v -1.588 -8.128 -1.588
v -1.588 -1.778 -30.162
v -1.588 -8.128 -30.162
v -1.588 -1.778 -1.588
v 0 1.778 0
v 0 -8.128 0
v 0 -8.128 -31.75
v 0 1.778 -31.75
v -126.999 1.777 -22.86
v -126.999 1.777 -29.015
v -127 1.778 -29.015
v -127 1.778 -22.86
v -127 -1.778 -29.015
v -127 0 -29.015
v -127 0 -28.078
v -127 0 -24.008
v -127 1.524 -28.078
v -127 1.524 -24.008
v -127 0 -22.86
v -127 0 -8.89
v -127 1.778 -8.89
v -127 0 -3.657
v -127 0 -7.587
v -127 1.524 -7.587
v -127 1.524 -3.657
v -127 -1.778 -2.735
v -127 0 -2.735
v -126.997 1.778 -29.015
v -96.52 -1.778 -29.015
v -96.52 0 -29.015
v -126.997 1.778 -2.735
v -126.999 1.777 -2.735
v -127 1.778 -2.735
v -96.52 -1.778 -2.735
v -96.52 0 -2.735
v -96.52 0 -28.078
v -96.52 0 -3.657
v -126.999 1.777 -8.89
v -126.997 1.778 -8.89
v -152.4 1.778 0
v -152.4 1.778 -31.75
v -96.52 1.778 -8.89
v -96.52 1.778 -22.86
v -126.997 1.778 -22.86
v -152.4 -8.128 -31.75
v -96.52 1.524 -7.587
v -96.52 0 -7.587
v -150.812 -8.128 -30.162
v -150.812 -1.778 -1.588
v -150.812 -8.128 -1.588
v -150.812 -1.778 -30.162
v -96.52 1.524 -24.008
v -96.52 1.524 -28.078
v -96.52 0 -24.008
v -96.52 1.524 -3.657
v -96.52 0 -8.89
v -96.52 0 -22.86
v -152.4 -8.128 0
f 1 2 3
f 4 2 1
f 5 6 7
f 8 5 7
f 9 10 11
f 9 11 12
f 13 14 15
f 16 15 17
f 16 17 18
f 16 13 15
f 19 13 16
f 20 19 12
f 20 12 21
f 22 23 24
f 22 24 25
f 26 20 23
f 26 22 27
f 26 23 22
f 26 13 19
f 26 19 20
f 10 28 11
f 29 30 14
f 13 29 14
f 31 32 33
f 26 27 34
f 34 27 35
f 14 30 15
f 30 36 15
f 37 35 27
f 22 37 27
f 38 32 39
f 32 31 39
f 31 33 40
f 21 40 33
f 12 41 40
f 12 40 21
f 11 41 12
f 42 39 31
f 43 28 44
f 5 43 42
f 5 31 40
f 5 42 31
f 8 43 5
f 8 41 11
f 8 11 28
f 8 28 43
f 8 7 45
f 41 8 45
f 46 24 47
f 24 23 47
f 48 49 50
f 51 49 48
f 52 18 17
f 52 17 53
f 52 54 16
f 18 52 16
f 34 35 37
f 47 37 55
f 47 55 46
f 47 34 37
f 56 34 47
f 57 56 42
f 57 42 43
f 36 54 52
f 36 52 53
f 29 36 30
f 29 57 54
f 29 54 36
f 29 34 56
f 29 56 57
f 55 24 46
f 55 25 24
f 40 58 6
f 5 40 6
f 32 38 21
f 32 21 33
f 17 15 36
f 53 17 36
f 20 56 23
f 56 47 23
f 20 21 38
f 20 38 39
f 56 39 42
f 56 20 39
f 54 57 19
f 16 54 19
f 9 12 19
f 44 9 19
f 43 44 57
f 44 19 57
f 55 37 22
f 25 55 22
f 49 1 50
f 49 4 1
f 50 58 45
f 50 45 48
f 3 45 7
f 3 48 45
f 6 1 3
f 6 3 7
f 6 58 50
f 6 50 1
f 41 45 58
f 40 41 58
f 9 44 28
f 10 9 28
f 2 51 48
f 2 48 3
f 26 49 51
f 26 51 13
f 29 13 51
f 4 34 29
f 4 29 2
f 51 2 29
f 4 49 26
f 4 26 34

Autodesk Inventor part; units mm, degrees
ref_plane "YZ Plane" through (0, 0, 0) normal (1, 0, 0) x (0, 1, 0)
ref_plane "XZ Plane" through (0, 0, 0) normal (0, 1, 0) x (-1, 0, 0)
ref_plane "XY Plane" through (0, 0, 0) normal (0, 0, 1) x (1, 0, 0)
sketch "Sketch1" plane through (0, 0, 0) normal (0, 1, 0) x (-1, 0, 0)
  line L0 (0, 0) -> (152.4, 0)
  line L1 (152.4, 0) -> (152.4, -31.75)
  line L2 (152.4, -31.75) -> (0, -31.75)
  line L3 (0, -31.75) -> (0, 0)
  line L4 (127, -8.89) -> (96.52, -8.89)
  line L5 (96.52, -8.89) -> (96.52, -22.86)
  line L6 (96.52, -22.86) -> (127, -22.86)
  line L7 (127, -22.86) -> (127, -8.89)
  line L8 (117.2368, -8.89) -> (117.2368, 0)
  line L9 (117.2368, -22.86) -> (117.2368, -31.75)
  dimension "d0" = 152.4
  dimension "d1" = 31.75
  dimension "d2" = 30.48
  dimension "d3" = 13.97
  dimension "d4" = 25.4
extrude "Extrusion1" add sketch "Sketch1" along normal blind 1.778 contours L0 L8 L4 L5 L6 L9 L2 L3 | L0 L1 L2 L9 L6 L7 L4 L8
sketch "Sketch2" plane through (0, 0, 0) normal (0, -1, 0) x (1, 0, 0)
  line L0 (-152.4, 0) -> (0, 0) projected
  line L1 (0, 0) -> (0, -31.75) projected
  line L2 (-152.4, 0) -> (0, 0)
  line L3 (0, 0) -> (0, -31.75)
  line L4 (0, -31.75) -> (-152.4, -31.75)
  line L5 (-152.4, -31.75) -> (-152.4, 0)
  line L6 (-127, -2.7348) -> (-96.52, -2.7348)
  line L7 (-96.52, -2.7348) -> (-96.52, -29.0152)
  line L8 (-96.52, -29.0152) -> (-127, -29.0152)
  line L9 (-127, -29.0152) -> (-127, -2.7348)
  line L10 (-127, -8.89) -> (-127, -22.86) projected
  line L11 (-103.8171, -2.7348) -> (-103.8171, 0)
  line L12 (-104.7941, -29.0152) -> (-104.7941, -31.75)
  line L13 (0, -31.75) -> (-152.4, -31.75) projected
  dimension "d7" = 30.48
  dimension "d8" = 0
extrude "Extrusion2" add sketch "Sketch2" along normal blind 1.778 contours L0 L11 L6 L9 L8 L12 L4 L5 | L0 L1 L4 L12 L8 L7 L6 L11
sketch "Sketch3" plane through (0, -1.778, 0) normal (0, -1, 0) x (1, 0, 0)
  line L0 (-152.4, 0) -> (0, 0) projected
  line L1 (0, -31.75) -> (-152.4, -31.75) projected
  line L2 (-152.4, 0) -> (0, 0)
  line L3 (0, 0) -> (0, -31.75)
  line L4 (0, -31.75) -> (-152.4, -31.75)
  line L5 (-152.4, -31.75) -> (-152.4, 0)
  line L6 (-1.5875, -30.1625) -> (-1.5875, -1.5875)
  line L7 (-1.5875, -1.5875) -> (-150.8125, -1.5875)
  line L8 (-150.8125, -1.5875) -> (-150.8125, -30.1625)
  line L9 (-150.8125, -30.1625) -> (-1.5875, -30.1625)
  dimension "d11" = 1.5875
extrude "Extrusion3" add sketch "Sketch3" along normal blind 6.35
sketch "Sketch4" plane through (0, 1.778, 0) normal (0, 1, 0) x (1, 0, 0)
  line L0 (-152.4, 0) -> (0, 0) projected
  line L1 (-152.4, 31.75) -> (-152.4, 0) projected
  line L2 (0, 0) -> (-152.4, 0)
  line L3 (-152.4, 0) -> (-152.4, 31.75)
  line L4 (-152.4, 31.75) -> (0, 31.75)
  line L5 (-6.35, 25.4) -> (-146.05, 25.4)
  line L6 (-146.05, 25.4) -> (-146.05, 6.35)
  line L7 (-146.05, 6.35) -> (-6.35, 6.35)
  line L8 (-13.5859, 25.4) -> (0, 25.4)
  line L9 (0, 0) -> (0, 31.75) projected
  line L10 (-13.5859, 6.35) -> (0, 6.35)
  line L11 (0, 31.75) -> (0, 25.4)
  line L12 (0, 6.35) -> (0, 0)
  line L13 (-127, 22.86) -> (-96.52, 22.86) projected
  line L14 (-96.52, 22.86) -> (-93.98, 22.86)
  line L15 (-93.98, 22.86) -> (-93.98, 25.4)
  line L16 (-93.98, 25.4) -> (-96.52, 25.4)
  line L17 (-96.52, 25.4) -> (-96.52, 22.86)
  line L18 (-96.52, 2.7348) -> (-96.52, 29.0152) projected
  line L19 (-96.52, 6.35) -> (-93.98, 6.35)
  line L20 (-93.98, 6.35) -> (-93.98, 8.89)
  line L21 (-93.98, 8.89) -> (-96.52, 8.89)
  line L22 (-96.52, 8.89) -> (-96.52, 6.35)
  line L23 (-121.92, 25.4) -> (-124.46, 25.4)
  line L24 (-124.46, 25.4) -> (-124.46, 22.86)
  line L25 (-124.46, 22.86) -> (-121.92, 22.86)
  line L26 (-121.92, 22.86) -> (-121.92, 25.4)
  line L27 (-121.92, 6.35) -> (-124.46, 6.35)
  line L28 (-124.46, 6.35) -> (-124.46, 8.89)
  line L29 (-124.46, 8.89) -> (-121.92, 8.89)
  line L30 (-121.92, 8.89) -> (-121.92, 6.35)
  line L31 (-68.58, 25.4) -> (-66.04, 25.4)
  line L32 (-66.04, 25.4) -> (-66.04, 22.86)
  line L33 (-66.04, 22.86) -> (-68.58, 22.86)
  line L34 (-68.58, 22.86) -> (-68.58, 25.4)
  line L35 (-68.58, 6.35) -> (-66.04, 6.35)
  line L36 (-66.04, 6.35) -> (-66.04, 8.89)
  line L37 (-66.04, 8.89) -> (-68.58, 8.89)
  line L38 (-68.58, 8.89) -> (-68.58, 6.35)
  line L39 (-40.64, 6.35) -> (-38.1, 6.35)
  line L40 (-38.1, 6.35) -> (-38.1, 8.89)
  line L41 (-38.1, 8.89) -> (-40.64, 8.89)
  line L42 (-40.64, 8.89) -> (-40.64, 6.35)
  line L43 (-40.64, 25.4) -> (-38.1, 25.4)
  line L44 (-38.1, 25.4) -> (-38.1, 22.86)
  line L45 (-38.1, 22.86) -> (-40.64, 22.86)
  line L46 (-40.64, 22.86) -> (-40.64, 25.4)
  line L47 (-12.7, 25.4) -> (-10.16, 25.4)
  line L48 (-10.16, 25.4) -> (-10.16, 22.86)
  line L49 (-10.16, 22.86) -> (-12.7, 22.86)
  line L50 (-12.7, 22.86) -> (-12.7, 25.4)
  line L51 (-12.7, 6.35) -> (-10.16, 6.35)
  line L52 (-10.16, 6.35) -> (-10.16, 8.89)
  line L53 (-10.16, 8.89) -> (-12.7, 8.89)
  line L54 (-12.7, 8.89) -> (-12.7, 6.35)
  point P0 (-121.92, 7.62)
  point P1 (-96.52, 7.62)
  point P2 (-93.98, 24.13)
  point P3 (-68.58, 24.13)
  point P4 (-40.64, 24.13)
  point P5 (-66.04, 24.13)
  point P6 (-12.7, 24.13)
  point P7 (-38.1, 24.13)
  point P8 (-6.35, 6.35)
  dimension "d14" = 6.35
  dimension "d15" = 2.54
  dimension "d16" = 2.54
  dimension "d17" = 2.54
  dimension "d18" = 2.54
  dimension "d19" = 2.54
  dimension "d20" = 2.54
  dimension "d21" = 25.4
  dimension "d22" = 2.54
  dimension "d23" = 2.54
  dimension "d24" = 2.54
  dimension "d25" = 2.54
  dimension "d26" = 2.54
  dimension "d27" = 2.54
  dimension "d28" = 2.54
  dimension "d29" = 2.54
  dimension "d30" = 2.54
  dimension "d31" = 2.54
  dimension "d32" = 2.54
  dimension "d33" = 2.54
  dimension "d34" = 25.4
  dimension "d35" = 25.4
  dimension "d36" = 25.4
extrude "Extrusion4" add sketch "Sketch4" along normal blind 31.75 contours L1 L4 L9 L8 L5 L6 L7 L10 L0 | L7 L54 L53 L52 | L48 L49 L50 L5 | L7 L42 L41 L40 | L44 L45 L46 L5 | L7 L38 L37 L36 | L32 L33 L34 L5 | L7 L18 L21 L20 | L15 L14 L17 L5 | L7 L28 L29 L30 | L26 L13 L24 L5
sketch "Sketch5" plane through (-93.98, 1.778, -8.89) normal (0, 0, -1) x (-1, 0, 0)
  line L0 (2.54, 31.75) -> (0, 31.75)
  line L1 (0, 31.75) -> (0, 29.21)
  line L2 (0, 29.21) -> (2.54, 29.21)
  line L3 (2.54, 29.21) -> (2.54, 31.75)
  line L4 (30.48, 31.75) -> (27.94, 31.75) projected
  line L5 (30.48, 0) -> (30.48, 31.75) projected
  line L6 (27.94, 31.75) -> (30.48, 31.75)
  line L7 (30.48, 31.75) -> (30.48, 29.21)
  line L8 (30.48, 29.21) -> (27.94, 29.21)
  line L9 (27.94, 29.21) -> (27.94, 31.75)
  line L10 (-27.94, 0) -> (-27.94, 31.75) projected
  line L11 (-25.4, 0) -> (-25.4, 31.75) projected
  line L12 (-27.94, 29.21) -> (-25.4, 29.21)
  line L13 (-25.4, 29.21) -> (-25.4, 31.75)
  line L14 (-25.4, 31.75) -> (-27.94, 31.75)
  line L15 (-27.94, 31.75) -> (-27.94, 29.21)
  line L16 (-93.98, 31.75) -> (58.42, 31.75) projected
  line L17 (-27.94, 31.75) -> (-25.4, 31.75)
  line L18 (-25.4, 31.75) -> (-25.4, 29.21)
  line L19 (-25.4, 29.21) -> (-27.94, 29.21)
  line L20 (-27.94, 29.21) -> (-27.94, 31.75)
  line L21 (-53.34, 31.75) -> (-55.88, 31.75)
  line L22 (-55.88, 31.75) -> (-55.88, 29.21)
  line L23 (-55.88, 29.21) -> (-53.34, 29.21)
  line L24 (-53.34, 29.21) -> (-53.34, 31.75)
  line L25 (-81.28, 31.75) -> (-83.82, 31.75)
  line L26 (-83.82, 31.75) -> (-83.82, 29.21)
  line L27 (-83.82, 29.21) -> (-81.28, 29.21)
  line L28 (-81.28, 29.21) -> (-81.28, 31.75)
  line L29 (30.48, 31.75) -> (52.07, 31.75) projected
  line L30 (30.48, 31.75) -> (27.94, 31.75)
  line L31 (27.94, 31.75) -> (27.94, 29.21)
  line L32 (27.94, 29.21) -> (30.48, 29.21)
  line L33 (30.48, 29.21) -> (30.48, 31.75)
  point P0 (-93.98, -1.778)
  point P1 (0, 30.48)
  point P2 (-25.4, 30.48)
  point P3 (-27.94, 30.48)
  point P4 (-53.34, 30.48)
  point P5 (-81.28, 30.48)
  point P6 (-55.88, 30.48)
  point P7 (27.94, 30.48)
  point P8 (2.54, 30.48)
  dimension "d39" = 2.54
  dimension "d40" = 2.54
  dimension "d41" = 2.54
  dimension "d42" = 2.54
  dimension "d43" = 2.54
  dimension "d44" = 2.54
  dimension "d45" = 25.4
  dimension "d46" = 25.4
  dimension "d47" = 2.54
  dimension "d48" = 2.54
  dimension "d49" = 25.4
  dimension "d50" = 2.54
  dimension "d51" = 2.54
  dimension "d52" = 25.4
extrude "Extrusion5" add sketch "Sketch5" along normal up to next
sketch "Sketch6" plane through (0, 33.528, 0) normal (0, 1, 0) x (1, 0, 0)
  line L0 (-152.4, 31.75) -> (-152.4, 0) projected
  line L1 (0, 31.75) -> (-152.4, 31.75) projected
  line L2 (-152.4, 0) -> (0, 0)
  line L3 (0, 0) -> (0, 31.75)
  line L4 (0, 31.75) -> (-152.4, 31.75)
  line L5 (-152.4, 31.75) -> (-152.4, 0)
extrude "Extrusion6" add sketch "Sketch6" along normal blind 3.175
ref_plane "Work Plane1" through (-127, 1.778, -8.89) normal (0.7071, -0.7071, 0) x (0, 0, -1)
sketch "Sketch7" plane through (-127, 1.778, -8.89) normal (0.7071, -0.7071, 0) x (0, 0, -1)
  line L0 (20.1252, -1.2572) -> (20.1252, 20.2954) projected
  line L1 (20.1252, 0) -> (-6.1552, 0)
  line L2 (-6.1552, 0) -> (-6.1552, 127)
  line L3 (-6.1552, 127) -> (20.1252, 127)
  line L4 (20.1252, 127) -> (20.1252, 0)
  line L5 (0, 0) -> (13.97, 0) projected
  point P0 (-8.89, 88.5453)
  point P1 (20.1252, 20.2954)
  dimension "d58" = 0
  dimension "d59" = 127
extrude "Extrusion7" cut sketch "Sketch7" against normal blind 3.175
sketch "Sketch8" plane through (0, 1.778, 0) normal (0, 1, 0) x (1, 0, 0)
  line L0 (63.8737, 171.7375) -> (-193.0507, 171.7375)
  line L1 (-193.0507, 171.7375) -> (-193.0507, -76.4775)
  line L2 (-193.0507, -76.4775) -> (63.8737, -76.4775)
  line L3 (63.8737, -76.4775) -> (63.8737, 171.7375)
  point P0 (0, 0)
extrude "Extrusion8" cut sketch "Sketch8" along normal up to next
sketch "Sketch9" plane through (0, 0, 0) normal (0, -1, 0) x (1, 0, 0)
  line L0 (-96.52, -2.7348) -> (-96.52, -29.0152) projected
  line L1 (-127, -29.0152) -> (-127, -2.7348) projected
  line L2 (-96.52, -3.6571) -> (-127, -3.6571)
  line L3 (-127, -3.6571) -> (-127, -7.587)
  line L4 (-127, -7.587) -> (-96.52, -7.587)
  line L5 (-96.52, -7.587) -> (-96.52, -3.6571)
  line L6 (-96.52, -24.0081) -> (-127, -24.0081)
  line L7 (-127, -24.0081) -> (-127, -28.0783)
  line L8 (-127, -28.0783) -> (-96.52, -28.0783)
  line L9 (-96.52, -28.0783) -> (-96.52, -24.0081)
  point P0 (0, 0)
extrude "Extrusion9" cut sketch "Sketch9" against normal blind 1.524 contours L0 L4 L1 L2 | L0 L8 L1 L6
properties part number "Base"
